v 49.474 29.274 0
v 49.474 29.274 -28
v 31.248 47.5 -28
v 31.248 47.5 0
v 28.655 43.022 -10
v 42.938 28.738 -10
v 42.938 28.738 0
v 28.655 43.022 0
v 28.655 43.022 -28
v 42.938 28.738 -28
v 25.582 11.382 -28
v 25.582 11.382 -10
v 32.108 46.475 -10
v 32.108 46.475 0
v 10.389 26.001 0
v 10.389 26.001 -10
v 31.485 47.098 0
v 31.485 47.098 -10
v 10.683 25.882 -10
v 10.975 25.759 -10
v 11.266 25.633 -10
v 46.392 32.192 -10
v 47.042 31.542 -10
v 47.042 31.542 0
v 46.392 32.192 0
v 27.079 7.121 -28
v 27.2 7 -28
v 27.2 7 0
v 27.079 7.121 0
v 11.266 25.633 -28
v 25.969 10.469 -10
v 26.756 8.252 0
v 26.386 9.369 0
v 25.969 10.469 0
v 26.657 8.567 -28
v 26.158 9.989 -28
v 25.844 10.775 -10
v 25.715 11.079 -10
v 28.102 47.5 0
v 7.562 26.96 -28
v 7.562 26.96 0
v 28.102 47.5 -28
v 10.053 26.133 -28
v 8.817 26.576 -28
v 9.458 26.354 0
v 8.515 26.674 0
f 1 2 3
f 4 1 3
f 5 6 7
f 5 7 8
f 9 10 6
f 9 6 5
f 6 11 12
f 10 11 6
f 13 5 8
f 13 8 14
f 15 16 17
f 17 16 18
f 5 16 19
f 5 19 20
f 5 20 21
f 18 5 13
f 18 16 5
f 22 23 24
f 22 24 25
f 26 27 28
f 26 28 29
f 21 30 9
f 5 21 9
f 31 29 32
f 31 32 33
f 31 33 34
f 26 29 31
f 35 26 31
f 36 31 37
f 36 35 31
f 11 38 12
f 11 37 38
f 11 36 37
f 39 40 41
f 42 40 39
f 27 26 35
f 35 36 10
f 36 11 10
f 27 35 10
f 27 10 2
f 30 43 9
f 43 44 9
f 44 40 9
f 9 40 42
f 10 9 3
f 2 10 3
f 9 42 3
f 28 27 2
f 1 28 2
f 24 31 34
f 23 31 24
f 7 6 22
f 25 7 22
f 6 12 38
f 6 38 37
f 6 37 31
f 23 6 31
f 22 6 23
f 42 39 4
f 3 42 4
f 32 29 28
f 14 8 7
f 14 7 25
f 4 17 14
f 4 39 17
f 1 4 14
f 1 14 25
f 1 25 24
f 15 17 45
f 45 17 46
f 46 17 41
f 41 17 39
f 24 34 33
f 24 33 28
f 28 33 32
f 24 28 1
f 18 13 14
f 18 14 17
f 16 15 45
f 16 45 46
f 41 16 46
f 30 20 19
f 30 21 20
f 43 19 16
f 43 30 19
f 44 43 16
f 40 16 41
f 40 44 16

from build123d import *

# Parameters (mm, degrees)
BOX037_W               = 100
BOX037_H               = 2
BOX037_DEPTH           = 60
CYLINDER090_R          = 28
CYLINDER090_DEPTH      = 28
BOX035_W               = 40
BOX035_H               = 20.2
BOX035_DEPTH           = 10
BOX035_PLACEMENT_ANGLE = 45
BOX036_W               = 34
BOX036_H               = 22
BOX036_DEPTH           = 10
BOX036_PLACEMENT_ANGLE = 45
BOX033_W               = 26.5
BOX033_H               = 20.2
BOX033_DEPTH           = 28
BOX033_PLACEMENT_ANGLE = 45
BOX034_W               = 31.5
BOX034_H               = 28
BOX034_DEPTH           = 28
BOX034_PLACEMENT_ANGLE = 45


with BuildPart() as face006:
    # Box037 → Box037 (new body)
    with BuildSketch(Plane(origin=(-33, 47.5, -59), x_dir=(1, 0, 0), z_dir=(0, 0, 1))):
        with Locations((50, 1)):
            Rectangle(BOX037_W, BOX037_H)
    extrude(amount=BOX037_DEPTH)


with BuildPart() as cylinder090:
    # Cylinder090 → Cylinder090 (new body)
    with BuildSketch(Plane.XY.offset(-28)):
        Circle(CYLINDER090_R)
    extrude(amount=CYLINDER090_DEPTH)


with BuildPart() as cube017:
    # Box035 → Box035 (new body)
    with BuildSketch(Plane.XY):
        with Locations((20, 10.1)):
            Rectangle(BOX035_W, BOX035_H)
    extrude(amount=BOX035_DEPTH)


with BuildPart() as cube017_1:
    # Box035 placement: moved
    add(cube017.part.moved(Location((20, 5.8, -10))).rotate(Axis((20, 5.8, -10), (0, 0, 1)), BOX035_PLACEMENT_ANGLE))


with BuildPart() as servo_secure002:
    # Box036 → Box036 (new body)
    with BuildSketch(Plane.XY):
        with Locations((17, 11)):
            Rectangle(BOX036_W, BOX036_H)
    extrude(amount=BOX036_DEPTH)


with BuildPart() as servo_secure002_1:
    # Box036 placement: moved
    add(servo_secure002.part.moved(Location((23, 7.5, -10))).rotate(Axis((23, 7.5, -10), (0, 0, 1)), BOX036_PLACEMENT_ANGLE))

    # Cut092: cut Cube017
    add(cube017_1.part, mode=Mode.SUBTRACT)


with BuildPart() as inner:
    # Box033 → Box033 (new body)
    with BuildSketch(Plane.XY):
        with Locations((13.25, 10.1)):
            Rectangle(BOX033_W, BOX033_H)
    extrude(amount=BOX033_DEPTH)


with BuildPart() as inner_1:
    # Box033 placement: moved
    add(inner.part.moved(Location((24.2, 10, -28))).rotate(Axis((24.2, 10, -28), (0, 0, 1)), BOX033_PLACEMENT_ANGLE))


with BuildPart() as cut095:
    # Box034 → Box034 (new body)
    with BuildSketch(Plane.XY):
        with Locations((15.75, 14)):
            Rectangle(BOX034_W, BOX034_H)
    extrude(amount=BOX034_DEPTH)


with BuildPart() as cut095_1:
    # Box034 placement: moved
    add(cut095.part.moved(Location((27.2, 7, -28))).rotate(Axis((27.2, 7, -28), (0, 0, 1)), BOX034_PLACEMENT_ANGLE))

    # Cut091: cut inner
    add(inner_1.part, mode=Mode.SUBTRACT)

    # Cut093: cut servo-secure002
    add(servo_secure002_1.part, mode=Mode.SUBTRACT)

    # Cut094: cut Cylinder090
    add(cylinder090.part, mode=Mode.SUBTRACT)

    # Cut095: cut face006
    add(face006.part, mode=Mode.SUBTRACT)


solid = cut095_1.part
